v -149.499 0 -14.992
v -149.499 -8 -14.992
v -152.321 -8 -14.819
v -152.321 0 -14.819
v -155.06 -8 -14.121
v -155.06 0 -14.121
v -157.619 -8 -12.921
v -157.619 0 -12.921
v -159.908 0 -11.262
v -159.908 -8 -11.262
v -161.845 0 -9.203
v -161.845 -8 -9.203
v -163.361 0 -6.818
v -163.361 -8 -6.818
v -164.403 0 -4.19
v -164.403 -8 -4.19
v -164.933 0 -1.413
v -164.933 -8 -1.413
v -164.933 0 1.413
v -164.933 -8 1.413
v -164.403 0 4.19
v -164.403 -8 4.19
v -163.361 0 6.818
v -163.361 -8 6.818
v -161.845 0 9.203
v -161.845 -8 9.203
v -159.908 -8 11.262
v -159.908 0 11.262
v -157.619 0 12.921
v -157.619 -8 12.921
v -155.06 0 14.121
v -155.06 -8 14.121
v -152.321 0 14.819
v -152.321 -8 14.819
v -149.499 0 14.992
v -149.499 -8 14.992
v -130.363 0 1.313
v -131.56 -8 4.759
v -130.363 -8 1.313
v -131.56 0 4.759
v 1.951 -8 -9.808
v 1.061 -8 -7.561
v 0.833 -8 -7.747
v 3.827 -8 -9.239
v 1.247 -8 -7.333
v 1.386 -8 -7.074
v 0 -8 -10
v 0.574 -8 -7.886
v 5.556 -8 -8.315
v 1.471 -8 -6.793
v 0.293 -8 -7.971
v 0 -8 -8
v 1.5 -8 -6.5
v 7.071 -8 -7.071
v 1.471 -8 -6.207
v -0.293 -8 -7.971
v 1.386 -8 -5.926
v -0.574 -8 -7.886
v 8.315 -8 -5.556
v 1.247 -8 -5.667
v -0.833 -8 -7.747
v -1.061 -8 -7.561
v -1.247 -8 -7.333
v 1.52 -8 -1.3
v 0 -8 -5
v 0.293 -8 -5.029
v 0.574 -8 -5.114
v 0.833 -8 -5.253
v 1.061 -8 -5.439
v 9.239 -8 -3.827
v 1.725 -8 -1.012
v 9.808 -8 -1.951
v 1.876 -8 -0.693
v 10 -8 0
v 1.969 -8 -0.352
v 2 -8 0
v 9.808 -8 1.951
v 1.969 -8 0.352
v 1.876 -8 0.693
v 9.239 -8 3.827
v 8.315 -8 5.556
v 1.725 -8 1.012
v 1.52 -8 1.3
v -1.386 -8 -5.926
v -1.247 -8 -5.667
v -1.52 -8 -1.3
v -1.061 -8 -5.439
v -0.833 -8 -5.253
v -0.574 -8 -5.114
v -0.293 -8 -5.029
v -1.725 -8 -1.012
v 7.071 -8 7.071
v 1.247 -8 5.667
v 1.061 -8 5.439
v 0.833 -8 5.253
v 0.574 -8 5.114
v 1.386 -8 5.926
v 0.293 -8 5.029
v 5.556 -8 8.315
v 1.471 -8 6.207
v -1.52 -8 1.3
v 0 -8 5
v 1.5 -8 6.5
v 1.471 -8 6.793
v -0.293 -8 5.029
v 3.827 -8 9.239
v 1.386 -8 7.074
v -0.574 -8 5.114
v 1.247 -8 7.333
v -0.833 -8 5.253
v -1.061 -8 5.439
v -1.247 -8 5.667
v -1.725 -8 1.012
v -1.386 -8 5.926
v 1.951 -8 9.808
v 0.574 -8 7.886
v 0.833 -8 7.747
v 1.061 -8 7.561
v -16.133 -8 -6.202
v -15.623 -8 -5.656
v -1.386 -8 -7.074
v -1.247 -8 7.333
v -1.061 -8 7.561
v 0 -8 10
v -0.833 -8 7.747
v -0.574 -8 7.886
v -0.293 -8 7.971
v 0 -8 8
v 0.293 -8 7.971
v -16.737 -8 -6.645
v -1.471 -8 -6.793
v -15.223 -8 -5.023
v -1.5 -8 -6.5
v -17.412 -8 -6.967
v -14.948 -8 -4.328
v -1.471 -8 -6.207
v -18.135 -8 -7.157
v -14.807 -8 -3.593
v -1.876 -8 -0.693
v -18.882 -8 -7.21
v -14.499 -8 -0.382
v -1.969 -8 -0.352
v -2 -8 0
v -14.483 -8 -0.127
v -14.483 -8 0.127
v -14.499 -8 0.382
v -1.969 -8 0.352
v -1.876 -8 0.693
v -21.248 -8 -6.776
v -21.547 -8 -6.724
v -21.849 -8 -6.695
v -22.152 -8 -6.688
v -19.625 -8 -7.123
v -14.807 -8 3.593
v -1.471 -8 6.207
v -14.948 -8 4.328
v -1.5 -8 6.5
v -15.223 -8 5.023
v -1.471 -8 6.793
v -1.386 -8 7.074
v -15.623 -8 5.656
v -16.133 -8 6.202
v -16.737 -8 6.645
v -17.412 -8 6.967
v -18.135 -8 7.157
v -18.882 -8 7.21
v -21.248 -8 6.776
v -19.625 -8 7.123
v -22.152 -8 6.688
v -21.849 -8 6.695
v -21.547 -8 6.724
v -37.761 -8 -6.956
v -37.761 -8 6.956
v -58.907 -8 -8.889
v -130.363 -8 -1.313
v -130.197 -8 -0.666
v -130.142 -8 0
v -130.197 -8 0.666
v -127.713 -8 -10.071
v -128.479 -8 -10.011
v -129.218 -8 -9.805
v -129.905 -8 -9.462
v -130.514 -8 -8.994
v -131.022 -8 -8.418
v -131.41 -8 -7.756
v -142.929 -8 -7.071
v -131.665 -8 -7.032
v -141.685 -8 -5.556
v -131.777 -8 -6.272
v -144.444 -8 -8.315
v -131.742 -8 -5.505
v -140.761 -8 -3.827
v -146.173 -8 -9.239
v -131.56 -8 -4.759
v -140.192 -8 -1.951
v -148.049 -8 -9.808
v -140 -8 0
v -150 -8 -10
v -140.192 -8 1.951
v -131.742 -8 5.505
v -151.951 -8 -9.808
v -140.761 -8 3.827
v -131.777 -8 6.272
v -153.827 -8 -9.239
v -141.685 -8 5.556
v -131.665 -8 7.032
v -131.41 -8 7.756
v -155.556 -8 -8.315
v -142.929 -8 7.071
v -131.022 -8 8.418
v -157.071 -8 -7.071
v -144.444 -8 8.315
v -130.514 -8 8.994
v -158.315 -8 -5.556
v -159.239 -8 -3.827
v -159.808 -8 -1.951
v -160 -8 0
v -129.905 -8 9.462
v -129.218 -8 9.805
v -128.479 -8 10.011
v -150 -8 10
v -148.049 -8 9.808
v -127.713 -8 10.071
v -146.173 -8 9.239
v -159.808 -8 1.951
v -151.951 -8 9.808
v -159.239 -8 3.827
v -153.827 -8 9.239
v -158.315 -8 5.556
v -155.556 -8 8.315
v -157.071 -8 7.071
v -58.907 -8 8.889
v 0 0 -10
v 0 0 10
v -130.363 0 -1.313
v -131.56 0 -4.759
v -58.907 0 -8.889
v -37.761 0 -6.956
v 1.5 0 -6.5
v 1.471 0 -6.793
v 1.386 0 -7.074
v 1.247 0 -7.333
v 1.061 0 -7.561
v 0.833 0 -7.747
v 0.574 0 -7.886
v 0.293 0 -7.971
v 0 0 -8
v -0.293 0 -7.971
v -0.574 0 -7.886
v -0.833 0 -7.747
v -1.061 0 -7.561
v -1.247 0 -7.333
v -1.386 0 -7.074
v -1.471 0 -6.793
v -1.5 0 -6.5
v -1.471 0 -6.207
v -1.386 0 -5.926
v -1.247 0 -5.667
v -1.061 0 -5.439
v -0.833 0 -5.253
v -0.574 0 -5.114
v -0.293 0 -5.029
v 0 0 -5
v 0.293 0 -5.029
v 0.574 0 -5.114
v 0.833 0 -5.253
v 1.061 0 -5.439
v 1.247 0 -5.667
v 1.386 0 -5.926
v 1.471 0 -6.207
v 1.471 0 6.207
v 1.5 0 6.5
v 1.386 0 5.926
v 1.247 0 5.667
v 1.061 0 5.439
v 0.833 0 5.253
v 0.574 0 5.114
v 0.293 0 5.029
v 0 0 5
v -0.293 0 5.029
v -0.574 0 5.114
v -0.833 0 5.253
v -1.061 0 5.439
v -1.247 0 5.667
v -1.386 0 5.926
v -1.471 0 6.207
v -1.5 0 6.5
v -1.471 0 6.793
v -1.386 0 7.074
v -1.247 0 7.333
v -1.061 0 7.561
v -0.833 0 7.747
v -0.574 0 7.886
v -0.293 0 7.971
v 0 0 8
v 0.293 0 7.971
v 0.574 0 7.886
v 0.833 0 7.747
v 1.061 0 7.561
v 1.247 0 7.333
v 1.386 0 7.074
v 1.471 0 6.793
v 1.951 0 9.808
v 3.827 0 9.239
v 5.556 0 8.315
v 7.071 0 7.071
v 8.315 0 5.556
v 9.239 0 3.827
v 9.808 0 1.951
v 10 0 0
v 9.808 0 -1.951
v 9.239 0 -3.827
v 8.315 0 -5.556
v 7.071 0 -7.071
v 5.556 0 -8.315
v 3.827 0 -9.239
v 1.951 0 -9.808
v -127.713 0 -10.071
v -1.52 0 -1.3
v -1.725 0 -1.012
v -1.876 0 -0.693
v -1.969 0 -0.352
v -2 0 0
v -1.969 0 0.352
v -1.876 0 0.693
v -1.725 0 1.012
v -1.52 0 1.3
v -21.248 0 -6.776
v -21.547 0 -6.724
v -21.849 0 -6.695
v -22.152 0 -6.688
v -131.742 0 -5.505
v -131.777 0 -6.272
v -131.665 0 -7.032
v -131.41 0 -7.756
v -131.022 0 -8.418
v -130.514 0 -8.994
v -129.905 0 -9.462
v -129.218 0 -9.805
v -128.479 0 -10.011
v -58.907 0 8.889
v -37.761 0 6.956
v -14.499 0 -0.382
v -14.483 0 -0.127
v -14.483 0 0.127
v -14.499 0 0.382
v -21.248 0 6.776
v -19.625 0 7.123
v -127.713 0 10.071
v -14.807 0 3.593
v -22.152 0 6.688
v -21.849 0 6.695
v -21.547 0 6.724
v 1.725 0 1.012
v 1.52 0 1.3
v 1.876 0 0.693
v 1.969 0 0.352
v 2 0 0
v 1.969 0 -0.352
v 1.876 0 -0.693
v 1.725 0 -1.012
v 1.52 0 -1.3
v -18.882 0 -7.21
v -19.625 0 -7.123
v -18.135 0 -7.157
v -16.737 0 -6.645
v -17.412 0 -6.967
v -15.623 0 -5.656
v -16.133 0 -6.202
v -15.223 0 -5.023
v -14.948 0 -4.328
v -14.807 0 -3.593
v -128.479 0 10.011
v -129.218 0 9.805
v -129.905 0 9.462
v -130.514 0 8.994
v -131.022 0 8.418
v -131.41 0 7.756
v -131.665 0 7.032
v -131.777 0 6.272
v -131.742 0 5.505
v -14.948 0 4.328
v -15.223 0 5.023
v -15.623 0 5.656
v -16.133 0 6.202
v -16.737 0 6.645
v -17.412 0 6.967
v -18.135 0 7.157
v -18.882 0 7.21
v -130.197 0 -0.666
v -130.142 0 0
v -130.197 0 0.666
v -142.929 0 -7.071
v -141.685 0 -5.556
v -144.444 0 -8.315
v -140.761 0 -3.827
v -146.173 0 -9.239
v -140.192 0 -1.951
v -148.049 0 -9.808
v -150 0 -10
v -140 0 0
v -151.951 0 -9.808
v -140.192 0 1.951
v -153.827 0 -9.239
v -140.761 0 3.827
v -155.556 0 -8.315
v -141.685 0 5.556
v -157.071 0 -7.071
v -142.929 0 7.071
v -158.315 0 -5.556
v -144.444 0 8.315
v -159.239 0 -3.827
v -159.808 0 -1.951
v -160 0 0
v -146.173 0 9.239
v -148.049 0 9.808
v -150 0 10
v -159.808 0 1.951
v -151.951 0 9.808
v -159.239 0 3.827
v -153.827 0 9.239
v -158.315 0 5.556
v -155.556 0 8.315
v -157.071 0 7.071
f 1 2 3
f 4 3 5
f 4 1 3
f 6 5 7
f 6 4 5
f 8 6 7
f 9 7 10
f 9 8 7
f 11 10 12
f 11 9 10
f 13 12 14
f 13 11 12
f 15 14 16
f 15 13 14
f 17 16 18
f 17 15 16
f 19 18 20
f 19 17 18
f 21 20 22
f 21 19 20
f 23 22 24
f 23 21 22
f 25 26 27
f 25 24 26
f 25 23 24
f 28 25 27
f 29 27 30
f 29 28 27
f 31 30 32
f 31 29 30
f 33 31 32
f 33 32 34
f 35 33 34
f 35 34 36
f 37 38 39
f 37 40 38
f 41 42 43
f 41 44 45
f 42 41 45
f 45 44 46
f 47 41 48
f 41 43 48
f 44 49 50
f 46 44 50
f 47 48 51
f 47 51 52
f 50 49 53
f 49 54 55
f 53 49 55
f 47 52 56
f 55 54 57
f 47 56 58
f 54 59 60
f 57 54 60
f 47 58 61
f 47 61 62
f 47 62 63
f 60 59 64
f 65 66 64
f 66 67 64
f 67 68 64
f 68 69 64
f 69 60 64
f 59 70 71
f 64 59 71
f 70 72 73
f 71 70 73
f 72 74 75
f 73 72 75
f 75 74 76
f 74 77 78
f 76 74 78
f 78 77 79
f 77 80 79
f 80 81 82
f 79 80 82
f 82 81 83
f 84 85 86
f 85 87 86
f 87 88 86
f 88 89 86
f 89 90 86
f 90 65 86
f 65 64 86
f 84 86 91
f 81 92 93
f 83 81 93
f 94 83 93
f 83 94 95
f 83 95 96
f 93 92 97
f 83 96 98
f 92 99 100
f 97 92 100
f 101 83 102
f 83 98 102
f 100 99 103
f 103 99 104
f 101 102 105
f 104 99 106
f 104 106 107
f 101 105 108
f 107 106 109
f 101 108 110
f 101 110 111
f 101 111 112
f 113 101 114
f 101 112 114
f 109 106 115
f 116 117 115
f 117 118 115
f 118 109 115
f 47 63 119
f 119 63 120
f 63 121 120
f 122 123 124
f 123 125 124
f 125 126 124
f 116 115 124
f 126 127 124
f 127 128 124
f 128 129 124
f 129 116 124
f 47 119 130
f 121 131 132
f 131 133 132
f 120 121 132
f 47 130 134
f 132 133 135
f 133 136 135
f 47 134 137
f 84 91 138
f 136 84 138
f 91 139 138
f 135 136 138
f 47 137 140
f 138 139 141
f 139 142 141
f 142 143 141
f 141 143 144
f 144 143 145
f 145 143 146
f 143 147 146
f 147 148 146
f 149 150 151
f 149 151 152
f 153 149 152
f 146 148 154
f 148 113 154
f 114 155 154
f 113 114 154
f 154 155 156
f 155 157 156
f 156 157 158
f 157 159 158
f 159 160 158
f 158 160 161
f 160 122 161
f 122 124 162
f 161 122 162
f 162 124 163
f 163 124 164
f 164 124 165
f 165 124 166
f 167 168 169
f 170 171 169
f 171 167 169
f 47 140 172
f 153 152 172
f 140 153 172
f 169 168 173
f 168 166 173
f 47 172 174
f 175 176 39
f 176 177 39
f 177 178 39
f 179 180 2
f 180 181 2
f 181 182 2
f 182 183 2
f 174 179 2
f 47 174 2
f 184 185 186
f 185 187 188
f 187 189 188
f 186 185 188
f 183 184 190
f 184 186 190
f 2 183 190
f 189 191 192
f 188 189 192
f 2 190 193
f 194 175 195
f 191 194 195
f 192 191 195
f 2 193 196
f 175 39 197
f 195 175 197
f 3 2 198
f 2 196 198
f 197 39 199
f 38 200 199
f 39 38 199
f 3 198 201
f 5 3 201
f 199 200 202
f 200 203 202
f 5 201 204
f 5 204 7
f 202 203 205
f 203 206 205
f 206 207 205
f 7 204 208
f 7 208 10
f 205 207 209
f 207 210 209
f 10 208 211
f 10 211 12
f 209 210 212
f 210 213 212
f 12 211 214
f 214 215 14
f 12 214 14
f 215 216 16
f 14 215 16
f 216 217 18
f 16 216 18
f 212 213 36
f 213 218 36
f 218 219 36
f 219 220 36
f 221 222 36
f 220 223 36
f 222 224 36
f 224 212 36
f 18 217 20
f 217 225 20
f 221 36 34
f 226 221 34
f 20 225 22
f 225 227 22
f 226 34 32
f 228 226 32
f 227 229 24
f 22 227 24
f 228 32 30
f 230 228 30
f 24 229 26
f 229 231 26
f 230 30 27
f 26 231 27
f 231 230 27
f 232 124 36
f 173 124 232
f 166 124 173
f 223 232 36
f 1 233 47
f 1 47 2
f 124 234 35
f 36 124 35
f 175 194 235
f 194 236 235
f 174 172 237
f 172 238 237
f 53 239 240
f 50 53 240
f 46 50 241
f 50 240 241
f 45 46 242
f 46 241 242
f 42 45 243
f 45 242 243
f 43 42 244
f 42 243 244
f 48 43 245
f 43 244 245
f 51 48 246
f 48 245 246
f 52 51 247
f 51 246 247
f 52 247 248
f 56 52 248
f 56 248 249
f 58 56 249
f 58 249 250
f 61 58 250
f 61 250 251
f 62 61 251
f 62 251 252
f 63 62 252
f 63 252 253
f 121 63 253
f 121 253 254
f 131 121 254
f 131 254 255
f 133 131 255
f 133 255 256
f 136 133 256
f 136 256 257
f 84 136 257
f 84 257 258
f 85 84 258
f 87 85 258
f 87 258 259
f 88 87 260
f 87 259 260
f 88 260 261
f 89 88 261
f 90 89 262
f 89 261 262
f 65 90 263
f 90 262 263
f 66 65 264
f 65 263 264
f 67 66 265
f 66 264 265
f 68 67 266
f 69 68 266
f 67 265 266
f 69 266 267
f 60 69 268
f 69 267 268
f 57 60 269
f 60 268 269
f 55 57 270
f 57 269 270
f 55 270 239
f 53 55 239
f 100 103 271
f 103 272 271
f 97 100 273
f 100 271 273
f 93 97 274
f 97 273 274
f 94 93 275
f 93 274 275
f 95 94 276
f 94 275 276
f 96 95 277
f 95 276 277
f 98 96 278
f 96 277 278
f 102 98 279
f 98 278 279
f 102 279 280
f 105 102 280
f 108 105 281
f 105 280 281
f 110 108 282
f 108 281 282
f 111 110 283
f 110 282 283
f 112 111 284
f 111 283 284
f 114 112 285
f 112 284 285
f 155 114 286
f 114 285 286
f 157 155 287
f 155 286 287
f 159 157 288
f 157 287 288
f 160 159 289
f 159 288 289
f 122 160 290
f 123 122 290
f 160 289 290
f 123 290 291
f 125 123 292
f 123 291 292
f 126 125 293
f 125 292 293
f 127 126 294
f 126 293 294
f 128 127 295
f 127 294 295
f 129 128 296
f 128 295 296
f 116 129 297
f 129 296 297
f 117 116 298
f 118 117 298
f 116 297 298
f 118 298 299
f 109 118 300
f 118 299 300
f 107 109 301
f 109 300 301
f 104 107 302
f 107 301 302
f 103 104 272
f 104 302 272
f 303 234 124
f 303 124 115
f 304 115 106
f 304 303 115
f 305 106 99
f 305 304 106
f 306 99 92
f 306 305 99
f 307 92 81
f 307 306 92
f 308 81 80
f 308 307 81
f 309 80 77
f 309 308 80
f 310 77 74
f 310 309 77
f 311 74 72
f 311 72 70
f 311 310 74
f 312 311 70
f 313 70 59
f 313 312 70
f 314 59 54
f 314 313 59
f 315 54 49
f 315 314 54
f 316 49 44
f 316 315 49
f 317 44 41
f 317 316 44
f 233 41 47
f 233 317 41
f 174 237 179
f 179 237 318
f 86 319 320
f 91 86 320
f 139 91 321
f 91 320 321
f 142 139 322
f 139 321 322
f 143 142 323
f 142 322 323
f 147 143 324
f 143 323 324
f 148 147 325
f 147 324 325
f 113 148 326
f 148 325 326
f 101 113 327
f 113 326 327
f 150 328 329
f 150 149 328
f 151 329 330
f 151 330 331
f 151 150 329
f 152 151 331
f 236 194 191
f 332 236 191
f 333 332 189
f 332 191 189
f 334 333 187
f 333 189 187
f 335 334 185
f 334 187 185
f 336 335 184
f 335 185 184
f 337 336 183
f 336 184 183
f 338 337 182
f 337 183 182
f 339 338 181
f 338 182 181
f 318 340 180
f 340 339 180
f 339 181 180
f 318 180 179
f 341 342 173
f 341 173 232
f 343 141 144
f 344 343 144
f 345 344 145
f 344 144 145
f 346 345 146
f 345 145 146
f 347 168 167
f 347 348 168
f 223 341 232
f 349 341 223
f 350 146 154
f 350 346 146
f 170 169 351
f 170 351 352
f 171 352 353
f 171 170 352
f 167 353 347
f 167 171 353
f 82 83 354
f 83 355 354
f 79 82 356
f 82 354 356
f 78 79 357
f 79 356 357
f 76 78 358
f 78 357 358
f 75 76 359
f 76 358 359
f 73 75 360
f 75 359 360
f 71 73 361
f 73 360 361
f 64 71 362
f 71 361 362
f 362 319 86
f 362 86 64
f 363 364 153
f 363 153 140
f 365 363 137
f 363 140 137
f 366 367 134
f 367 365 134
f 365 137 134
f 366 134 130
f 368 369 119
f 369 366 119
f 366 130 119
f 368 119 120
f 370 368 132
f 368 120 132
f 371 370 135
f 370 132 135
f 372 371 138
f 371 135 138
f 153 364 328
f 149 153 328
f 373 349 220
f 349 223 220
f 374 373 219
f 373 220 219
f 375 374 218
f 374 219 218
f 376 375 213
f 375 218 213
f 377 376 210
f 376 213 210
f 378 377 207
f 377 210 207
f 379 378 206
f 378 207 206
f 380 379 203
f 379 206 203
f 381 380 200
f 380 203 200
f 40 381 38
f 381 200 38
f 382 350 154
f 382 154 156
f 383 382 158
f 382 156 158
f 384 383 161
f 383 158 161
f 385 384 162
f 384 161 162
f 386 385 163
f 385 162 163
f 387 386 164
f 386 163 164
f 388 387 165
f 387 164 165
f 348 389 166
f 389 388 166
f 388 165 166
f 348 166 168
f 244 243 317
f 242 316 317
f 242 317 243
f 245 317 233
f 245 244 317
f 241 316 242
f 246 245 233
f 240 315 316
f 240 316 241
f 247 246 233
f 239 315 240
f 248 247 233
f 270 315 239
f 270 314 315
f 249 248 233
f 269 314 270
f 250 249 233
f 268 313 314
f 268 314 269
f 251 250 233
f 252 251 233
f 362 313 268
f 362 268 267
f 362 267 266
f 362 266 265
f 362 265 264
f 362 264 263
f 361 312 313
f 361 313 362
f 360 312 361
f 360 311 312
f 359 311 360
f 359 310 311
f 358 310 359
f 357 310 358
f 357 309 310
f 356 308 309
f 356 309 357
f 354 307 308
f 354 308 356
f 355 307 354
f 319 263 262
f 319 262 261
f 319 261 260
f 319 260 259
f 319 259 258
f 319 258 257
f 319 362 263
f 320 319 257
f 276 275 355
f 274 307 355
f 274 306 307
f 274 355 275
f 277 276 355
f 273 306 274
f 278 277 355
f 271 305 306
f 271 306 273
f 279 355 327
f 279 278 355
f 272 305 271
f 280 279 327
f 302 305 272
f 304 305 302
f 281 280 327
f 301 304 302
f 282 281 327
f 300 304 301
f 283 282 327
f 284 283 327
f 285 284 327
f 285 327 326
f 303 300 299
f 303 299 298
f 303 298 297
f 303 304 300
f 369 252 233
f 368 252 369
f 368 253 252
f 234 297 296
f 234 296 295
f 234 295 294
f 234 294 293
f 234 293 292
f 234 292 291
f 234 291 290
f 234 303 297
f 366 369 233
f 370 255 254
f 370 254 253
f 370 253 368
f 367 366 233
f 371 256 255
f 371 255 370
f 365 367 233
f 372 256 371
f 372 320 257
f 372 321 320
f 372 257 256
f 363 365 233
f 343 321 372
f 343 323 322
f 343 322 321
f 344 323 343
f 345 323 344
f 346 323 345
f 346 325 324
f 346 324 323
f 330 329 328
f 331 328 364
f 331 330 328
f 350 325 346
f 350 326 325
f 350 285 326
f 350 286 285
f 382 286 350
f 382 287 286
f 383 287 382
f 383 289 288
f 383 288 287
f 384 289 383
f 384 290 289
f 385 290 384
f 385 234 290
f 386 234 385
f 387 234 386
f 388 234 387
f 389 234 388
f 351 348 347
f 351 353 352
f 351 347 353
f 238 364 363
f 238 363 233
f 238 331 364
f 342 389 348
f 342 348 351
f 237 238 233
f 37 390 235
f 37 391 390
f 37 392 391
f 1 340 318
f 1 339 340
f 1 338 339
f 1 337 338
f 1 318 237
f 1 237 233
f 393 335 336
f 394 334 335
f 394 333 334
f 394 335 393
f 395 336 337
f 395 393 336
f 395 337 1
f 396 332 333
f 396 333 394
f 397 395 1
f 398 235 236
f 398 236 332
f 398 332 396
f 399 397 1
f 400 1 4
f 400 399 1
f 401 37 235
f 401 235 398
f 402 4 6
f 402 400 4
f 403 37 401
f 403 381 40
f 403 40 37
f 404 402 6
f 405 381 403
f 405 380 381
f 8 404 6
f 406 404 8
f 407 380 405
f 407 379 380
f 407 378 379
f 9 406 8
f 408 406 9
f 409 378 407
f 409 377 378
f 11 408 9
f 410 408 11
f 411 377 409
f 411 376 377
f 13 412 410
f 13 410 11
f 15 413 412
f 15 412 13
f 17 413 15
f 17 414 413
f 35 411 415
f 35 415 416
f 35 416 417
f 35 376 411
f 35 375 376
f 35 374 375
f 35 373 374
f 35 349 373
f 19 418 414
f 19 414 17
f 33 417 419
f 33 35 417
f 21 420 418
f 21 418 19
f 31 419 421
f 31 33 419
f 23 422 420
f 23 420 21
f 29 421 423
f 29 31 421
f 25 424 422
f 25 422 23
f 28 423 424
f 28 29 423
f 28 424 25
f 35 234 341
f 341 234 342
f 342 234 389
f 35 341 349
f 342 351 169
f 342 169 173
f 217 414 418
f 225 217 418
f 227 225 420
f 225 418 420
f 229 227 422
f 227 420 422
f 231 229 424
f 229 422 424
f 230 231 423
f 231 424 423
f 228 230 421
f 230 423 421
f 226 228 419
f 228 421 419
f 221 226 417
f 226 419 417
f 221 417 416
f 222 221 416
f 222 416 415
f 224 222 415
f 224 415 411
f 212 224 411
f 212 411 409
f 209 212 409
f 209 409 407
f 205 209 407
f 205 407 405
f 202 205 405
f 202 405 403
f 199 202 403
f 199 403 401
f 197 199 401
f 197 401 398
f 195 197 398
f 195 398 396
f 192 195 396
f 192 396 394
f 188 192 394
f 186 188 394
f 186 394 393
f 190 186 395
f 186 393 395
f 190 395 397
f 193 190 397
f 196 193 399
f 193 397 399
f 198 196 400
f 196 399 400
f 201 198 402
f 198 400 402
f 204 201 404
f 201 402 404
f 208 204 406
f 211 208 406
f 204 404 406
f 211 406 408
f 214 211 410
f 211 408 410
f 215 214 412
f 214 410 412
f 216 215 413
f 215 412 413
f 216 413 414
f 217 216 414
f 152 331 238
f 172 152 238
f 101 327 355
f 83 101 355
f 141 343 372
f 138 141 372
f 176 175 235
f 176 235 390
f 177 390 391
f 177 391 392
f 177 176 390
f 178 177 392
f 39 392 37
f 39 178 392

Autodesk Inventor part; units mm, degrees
ref_plane "YZ Plane" through (0, 0, 0) normal (1, 0, 0) x (0, 1, 0)
ref_plane "XZ Plane" through (0, 0, 0) normal (0, 1, 0) x (-1, 0, 0)
ref_plane "XY Plane" through (0, 0, 0) normal (0, 0, 1) x (1, 0, 0)
sketch "Sketch1" plane through (0, 0, 0) normal (0, 1, 0) x (-1, 0, 0)
  line L0 (0, 8.5) -> (0, 6.3)
  line L1 (0, -6.3) -> (0, -8.5)
  line L2 (0, 0) -> (150, 0)
  circle A0 centre (150, 0) radius 10
  circle A1 centre (150, 0) radius 15
  circle A2 centre (0, 0) radius 2
  circle A3 centre (0, 0) radius 1.3
  line L3 (0, 1.3) -> (1.5199, 1.3)
  line L4 (0, 1.3) -> (-1.5199, 1.3)
  line L5 (0, -1.3) -> (1.5199, -1.3)
  line L6 (0, -1.3) -> (-1.5199, -1.3)
  circle A4 centre (0, 0) radius 10
  line L7 (0, 10) -> (149.4994, 14.9916)
  line L8 (0, -10) -> (149.4994, -14.9916)
  dimension "d8" = 30
  dimension "d13" = 20
  dimension "d6" = 150
  dimension "d7" = 20
  dimension "d11" = 4
  dimension "d12" = 2.6
extrude "Extrusion2" add sketch "Sketch1" against normal blind 8 contours L4 A2 L3 | L5 A2 L6 | A4 L7 A1 L2 | A4 | L2 A1 L8 A4 | A1
sketch "Sketch3" plane through (0, 0, 0) normal (0, 1, 0) x (1, 0, 0)
  line L0 (-14.4626, 0) -> (-15.2355, -8.0607)
  line L1 (-15.2355, -8.0607) -> (-21.6951, -6.6804)
  line L2 (-21.6951, -6.6804) -> (-37.7613, -6.9565)
  line L3 (-37.7613, -6.9565) -> (-58.9067, -8.8888)
  line L4 (-58.9067, -8.8888) -> (-133.4402, -10.1695)
  line L5 (-133.4402, -10.1695) -> (-129.907, 0)
  line L6 (-129.907, 0) -> (-14.4626, 0)
  line L7 (-14.4626, 0) -> (-15.2355, 8.0607)
  line L8 (-15.2355, 8.0607) -> (-21.6951, 6.6804)
  line L9 (-21.6951, 6.6804) -> (-37.7613, 6.9565)
  line L10 (-37.7613, 6.9565) -> (-58.9067, 8.8888)
  line L11 (-58.9067, 8.8888) -> (-133.4402, 10.1695)
  line L12 (-133.4402, 10.1695) -> (-129.907, 0)
  point P0 (0, 0)
extrude "Extrusion3" cut sketch "Sketch3" against normal through all
fillet "Fillet1" radius 4 12 edges at (-15.2355, -4, -8.0607) (-14.4626, -4, 0) (-15.2355, -4, 8.0607) (-21.6951, -4, 6.6804) (-37.7613, -4, 6.9565) (-21.6951, -4, -6.6804) (-37.7613, -4, -6.9565) (-58.9067, -4, -8.8888) (-133.4402, -4, -10.1695) (-129.907, -4, 0) (-133.4402, -4, 10.1695) (-58.9067, -4, 8.8888)
sketch "Sketch4" plane through (0, 0, 0) normal (0, 1, 0) x (1, 0, 0)
  circle A0 centre (0, 0) radius 6.5
  circle A1 centre (0, 6.5) radius 1.5
  circle A2 centre (0, -6.5) radius 1.5
  dimension "d19" = 13
  dimension "d20" = 3
  dimension "d21" = 3
extrude "Extrusion4" cut sketch "Sketch4" against normal through all contours A1 A0 | A0 A1 | A2 A0 | A0 A2
properties material "Polycarbonate, Clear"
